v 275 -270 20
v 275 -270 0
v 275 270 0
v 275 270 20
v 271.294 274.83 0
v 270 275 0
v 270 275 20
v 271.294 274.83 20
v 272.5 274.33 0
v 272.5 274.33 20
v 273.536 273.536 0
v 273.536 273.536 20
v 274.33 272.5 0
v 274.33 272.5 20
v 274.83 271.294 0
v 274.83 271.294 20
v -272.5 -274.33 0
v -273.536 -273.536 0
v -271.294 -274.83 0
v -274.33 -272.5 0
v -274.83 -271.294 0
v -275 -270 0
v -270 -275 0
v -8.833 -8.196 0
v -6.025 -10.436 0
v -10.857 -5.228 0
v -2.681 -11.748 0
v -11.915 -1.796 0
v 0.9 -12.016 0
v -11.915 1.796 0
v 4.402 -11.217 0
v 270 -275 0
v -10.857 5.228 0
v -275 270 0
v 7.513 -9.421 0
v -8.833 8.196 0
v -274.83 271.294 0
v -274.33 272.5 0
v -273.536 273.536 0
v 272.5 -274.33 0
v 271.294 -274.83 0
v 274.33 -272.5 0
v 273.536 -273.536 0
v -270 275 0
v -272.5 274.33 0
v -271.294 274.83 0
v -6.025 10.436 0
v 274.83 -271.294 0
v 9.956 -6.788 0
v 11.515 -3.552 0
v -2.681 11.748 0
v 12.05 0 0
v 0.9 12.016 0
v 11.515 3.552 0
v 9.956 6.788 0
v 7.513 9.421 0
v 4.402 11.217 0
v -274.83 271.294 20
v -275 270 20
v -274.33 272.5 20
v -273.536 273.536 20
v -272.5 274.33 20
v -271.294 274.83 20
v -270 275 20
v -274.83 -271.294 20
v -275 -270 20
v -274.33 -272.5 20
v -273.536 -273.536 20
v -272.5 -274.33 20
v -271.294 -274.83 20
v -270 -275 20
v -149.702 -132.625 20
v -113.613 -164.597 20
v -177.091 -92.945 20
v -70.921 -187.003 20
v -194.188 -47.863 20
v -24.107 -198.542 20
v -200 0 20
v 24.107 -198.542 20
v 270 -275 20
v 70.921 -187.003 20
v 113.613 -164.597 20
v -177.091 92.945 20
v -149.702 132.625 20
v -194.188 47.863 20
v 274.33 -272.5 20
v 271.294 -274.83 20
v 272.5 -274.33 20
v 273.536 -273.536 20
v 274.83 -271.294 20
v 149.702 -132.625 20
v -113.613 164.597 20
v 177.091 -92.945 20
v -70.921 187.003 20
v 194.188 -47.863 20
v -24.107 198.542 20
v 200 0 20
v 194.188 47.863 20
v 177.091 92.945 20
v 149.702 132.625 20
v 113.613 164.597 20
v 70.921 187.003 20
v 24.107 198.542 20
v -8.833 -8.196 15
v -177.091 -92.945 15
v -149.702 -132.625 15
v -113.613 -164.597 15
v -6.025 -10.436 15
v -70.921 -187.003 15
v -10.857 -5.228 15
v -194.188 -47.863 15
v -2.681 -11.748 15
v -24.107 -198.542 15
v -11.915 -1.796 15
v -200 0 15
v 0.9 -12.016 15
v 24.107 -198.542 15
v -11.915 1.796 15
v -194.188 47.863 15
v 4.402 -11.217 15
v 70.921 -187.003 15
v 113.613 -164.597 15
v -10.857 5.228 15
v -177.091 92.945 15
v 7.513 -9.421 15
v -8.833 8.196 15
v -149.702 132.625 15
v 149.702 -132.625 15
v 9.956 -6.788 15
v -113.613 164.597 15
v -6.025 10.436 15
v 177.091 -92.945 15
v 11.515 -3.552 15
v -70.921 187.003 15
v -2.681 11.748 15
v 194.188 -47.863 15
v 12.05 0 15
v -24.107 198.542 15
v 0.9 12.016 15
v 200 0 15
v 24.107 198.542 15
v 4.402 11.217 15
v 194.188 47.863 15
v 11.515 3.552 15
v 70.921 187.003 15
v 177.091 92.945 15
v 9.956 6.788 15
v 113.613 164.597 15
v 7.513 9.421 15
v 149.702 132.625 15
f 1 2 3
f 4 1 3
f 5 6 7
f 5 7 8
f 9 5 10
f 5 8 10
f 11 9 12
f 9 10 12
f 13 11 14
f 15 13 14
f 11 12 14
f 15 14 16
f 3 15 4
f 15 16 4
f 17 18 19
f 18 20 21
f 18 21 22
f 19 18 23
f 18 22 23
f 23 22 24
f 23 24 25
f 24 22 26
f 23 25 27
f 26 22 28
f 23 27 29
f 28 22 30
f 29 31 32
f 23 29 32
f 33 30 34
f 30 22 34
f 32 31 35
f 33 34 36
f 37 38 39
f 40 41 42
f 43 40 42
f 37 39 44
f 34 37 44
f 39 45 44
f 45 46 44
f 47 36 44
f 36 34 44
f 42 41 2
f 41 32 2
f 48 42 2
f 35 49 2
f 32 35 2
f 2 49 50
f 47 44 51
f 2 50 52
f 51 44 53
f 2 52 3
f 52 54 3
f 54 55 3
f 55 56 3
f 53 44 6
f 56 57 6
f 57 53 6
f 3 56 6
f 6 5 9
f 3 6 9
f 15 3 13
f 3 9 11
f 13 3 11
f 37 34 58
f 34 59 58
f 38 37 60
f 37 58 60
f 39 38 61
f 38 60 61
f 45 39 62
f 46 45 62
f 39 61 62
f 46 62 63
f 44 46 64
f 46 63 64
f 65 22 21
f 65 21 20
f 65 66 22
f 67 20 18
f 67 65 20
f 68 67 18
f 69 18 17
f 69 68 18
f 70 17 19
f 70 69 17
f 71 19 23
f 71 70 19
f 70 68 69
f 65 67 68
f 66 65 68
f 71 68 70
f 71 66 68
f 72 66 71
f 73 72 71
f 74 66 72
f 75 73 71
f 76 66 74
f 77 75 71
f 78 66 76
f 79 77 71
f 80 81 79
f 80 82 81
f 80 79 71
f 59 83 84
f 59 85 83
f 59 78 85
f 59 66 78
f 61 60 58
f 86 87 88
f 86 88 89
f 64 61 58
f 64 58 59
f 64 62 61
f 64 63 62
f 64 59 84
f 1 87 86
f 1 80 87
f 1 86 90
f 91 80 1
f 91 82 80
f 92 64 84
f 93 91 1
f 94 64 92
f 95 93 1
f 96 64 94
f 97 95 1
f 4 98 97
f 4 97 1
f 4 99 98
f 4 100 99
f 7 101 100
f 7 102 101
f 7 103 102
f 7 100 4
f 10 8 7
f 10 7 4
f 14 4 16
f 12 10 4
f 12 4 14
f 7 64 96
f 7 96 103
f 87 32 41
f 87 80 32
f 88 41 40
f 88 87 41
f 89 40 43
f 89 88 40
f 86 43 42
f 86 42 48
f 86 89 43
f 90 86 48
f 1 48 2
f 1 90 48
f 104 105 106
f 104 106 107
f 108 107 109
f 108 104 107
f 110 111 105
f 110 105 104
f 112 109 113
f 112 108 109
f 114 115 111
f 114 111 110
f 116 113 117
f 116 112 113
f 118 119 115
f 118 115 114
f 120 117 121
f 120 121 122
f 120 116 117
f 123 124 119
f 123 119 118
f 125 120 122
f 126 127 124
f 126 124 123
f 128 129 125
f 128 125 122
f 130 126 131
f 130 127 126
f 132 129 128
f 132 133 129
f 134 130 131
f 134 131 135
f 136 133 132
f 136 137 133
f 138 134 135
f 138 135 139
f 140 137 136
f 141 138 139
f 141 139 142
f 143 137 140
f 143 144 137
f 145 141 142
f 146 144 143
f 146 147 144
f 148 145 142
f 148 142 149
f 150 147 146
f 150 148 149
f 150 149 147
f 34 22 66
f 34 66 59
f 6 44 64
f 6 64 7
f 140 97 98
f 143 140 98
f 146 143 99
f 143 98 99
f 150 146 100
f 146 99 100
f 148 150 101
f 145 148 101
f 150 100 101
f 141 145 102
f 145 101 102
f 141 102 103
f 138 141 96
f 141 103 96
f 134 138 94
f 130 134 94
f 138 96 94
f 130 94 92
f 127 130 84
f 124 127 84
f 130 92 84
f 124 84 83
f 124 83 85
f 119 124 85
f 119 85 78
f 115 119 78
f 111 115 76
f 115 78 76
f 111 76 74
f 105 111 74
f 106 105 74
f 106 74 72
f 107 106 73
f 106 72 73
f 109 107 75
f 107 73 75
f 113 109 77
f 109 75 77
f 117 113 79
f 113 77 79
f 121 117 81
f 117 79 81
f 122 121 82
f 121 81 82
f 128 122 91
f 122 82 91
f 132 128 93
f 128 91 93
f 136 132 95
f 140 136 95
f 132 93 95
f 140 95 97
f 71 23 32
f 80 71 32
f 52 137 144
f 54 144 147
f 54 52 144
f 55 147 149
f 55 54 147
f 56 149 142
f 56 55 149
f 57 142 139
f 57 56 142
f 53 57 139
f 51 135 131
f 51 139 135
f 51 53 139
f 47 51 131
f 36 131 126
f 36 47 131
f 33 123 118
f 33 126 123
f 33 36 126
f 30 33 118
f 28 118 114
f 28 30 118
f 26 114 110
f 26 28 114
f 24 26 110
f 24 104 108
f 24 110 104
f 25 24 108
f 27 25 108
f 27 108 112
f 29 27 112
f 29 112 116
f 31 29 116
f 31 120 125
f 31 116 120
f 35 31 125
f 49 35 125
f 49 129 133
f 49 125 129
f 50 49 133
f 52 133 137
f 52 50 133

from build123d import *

# Parameters (mm, degrees)
F0_W     = 550
F0_H     = 550
F0_R     = 12.05
F1_DEPTH = 20
F2_R     = 5
F3_R     = 200
F4_DEPTH = 5


with BuildPart() as f1:
    # F0 (on Top) → F1 (new body)
    with BuildSketch(Plane.XY):
        Rectangle(F0_W, F0_H)
        Circle(F0_R, mode=Mode.SUBTRACT)
    extrude(amount=F1_DEPTH)

    # F2
    f2_edges = [f1.edges().sort_by_distance(p)[0] for p in [
        (-275, -275, 10),
        (275, -275, 10),
        (275, 275, 10),
        (-275, 275, 10),
    ]]
    fillet(f2_edges, radius=F2_R)

    # F3 (on face) → F4 (cut)
    with BuildSketch(Plane.XY.offset(20)):
        Circle(F3_R)
    extrude(amount=-F4_DEPTH, mode=Mode.SUBTRACT)


solid = f1.part
